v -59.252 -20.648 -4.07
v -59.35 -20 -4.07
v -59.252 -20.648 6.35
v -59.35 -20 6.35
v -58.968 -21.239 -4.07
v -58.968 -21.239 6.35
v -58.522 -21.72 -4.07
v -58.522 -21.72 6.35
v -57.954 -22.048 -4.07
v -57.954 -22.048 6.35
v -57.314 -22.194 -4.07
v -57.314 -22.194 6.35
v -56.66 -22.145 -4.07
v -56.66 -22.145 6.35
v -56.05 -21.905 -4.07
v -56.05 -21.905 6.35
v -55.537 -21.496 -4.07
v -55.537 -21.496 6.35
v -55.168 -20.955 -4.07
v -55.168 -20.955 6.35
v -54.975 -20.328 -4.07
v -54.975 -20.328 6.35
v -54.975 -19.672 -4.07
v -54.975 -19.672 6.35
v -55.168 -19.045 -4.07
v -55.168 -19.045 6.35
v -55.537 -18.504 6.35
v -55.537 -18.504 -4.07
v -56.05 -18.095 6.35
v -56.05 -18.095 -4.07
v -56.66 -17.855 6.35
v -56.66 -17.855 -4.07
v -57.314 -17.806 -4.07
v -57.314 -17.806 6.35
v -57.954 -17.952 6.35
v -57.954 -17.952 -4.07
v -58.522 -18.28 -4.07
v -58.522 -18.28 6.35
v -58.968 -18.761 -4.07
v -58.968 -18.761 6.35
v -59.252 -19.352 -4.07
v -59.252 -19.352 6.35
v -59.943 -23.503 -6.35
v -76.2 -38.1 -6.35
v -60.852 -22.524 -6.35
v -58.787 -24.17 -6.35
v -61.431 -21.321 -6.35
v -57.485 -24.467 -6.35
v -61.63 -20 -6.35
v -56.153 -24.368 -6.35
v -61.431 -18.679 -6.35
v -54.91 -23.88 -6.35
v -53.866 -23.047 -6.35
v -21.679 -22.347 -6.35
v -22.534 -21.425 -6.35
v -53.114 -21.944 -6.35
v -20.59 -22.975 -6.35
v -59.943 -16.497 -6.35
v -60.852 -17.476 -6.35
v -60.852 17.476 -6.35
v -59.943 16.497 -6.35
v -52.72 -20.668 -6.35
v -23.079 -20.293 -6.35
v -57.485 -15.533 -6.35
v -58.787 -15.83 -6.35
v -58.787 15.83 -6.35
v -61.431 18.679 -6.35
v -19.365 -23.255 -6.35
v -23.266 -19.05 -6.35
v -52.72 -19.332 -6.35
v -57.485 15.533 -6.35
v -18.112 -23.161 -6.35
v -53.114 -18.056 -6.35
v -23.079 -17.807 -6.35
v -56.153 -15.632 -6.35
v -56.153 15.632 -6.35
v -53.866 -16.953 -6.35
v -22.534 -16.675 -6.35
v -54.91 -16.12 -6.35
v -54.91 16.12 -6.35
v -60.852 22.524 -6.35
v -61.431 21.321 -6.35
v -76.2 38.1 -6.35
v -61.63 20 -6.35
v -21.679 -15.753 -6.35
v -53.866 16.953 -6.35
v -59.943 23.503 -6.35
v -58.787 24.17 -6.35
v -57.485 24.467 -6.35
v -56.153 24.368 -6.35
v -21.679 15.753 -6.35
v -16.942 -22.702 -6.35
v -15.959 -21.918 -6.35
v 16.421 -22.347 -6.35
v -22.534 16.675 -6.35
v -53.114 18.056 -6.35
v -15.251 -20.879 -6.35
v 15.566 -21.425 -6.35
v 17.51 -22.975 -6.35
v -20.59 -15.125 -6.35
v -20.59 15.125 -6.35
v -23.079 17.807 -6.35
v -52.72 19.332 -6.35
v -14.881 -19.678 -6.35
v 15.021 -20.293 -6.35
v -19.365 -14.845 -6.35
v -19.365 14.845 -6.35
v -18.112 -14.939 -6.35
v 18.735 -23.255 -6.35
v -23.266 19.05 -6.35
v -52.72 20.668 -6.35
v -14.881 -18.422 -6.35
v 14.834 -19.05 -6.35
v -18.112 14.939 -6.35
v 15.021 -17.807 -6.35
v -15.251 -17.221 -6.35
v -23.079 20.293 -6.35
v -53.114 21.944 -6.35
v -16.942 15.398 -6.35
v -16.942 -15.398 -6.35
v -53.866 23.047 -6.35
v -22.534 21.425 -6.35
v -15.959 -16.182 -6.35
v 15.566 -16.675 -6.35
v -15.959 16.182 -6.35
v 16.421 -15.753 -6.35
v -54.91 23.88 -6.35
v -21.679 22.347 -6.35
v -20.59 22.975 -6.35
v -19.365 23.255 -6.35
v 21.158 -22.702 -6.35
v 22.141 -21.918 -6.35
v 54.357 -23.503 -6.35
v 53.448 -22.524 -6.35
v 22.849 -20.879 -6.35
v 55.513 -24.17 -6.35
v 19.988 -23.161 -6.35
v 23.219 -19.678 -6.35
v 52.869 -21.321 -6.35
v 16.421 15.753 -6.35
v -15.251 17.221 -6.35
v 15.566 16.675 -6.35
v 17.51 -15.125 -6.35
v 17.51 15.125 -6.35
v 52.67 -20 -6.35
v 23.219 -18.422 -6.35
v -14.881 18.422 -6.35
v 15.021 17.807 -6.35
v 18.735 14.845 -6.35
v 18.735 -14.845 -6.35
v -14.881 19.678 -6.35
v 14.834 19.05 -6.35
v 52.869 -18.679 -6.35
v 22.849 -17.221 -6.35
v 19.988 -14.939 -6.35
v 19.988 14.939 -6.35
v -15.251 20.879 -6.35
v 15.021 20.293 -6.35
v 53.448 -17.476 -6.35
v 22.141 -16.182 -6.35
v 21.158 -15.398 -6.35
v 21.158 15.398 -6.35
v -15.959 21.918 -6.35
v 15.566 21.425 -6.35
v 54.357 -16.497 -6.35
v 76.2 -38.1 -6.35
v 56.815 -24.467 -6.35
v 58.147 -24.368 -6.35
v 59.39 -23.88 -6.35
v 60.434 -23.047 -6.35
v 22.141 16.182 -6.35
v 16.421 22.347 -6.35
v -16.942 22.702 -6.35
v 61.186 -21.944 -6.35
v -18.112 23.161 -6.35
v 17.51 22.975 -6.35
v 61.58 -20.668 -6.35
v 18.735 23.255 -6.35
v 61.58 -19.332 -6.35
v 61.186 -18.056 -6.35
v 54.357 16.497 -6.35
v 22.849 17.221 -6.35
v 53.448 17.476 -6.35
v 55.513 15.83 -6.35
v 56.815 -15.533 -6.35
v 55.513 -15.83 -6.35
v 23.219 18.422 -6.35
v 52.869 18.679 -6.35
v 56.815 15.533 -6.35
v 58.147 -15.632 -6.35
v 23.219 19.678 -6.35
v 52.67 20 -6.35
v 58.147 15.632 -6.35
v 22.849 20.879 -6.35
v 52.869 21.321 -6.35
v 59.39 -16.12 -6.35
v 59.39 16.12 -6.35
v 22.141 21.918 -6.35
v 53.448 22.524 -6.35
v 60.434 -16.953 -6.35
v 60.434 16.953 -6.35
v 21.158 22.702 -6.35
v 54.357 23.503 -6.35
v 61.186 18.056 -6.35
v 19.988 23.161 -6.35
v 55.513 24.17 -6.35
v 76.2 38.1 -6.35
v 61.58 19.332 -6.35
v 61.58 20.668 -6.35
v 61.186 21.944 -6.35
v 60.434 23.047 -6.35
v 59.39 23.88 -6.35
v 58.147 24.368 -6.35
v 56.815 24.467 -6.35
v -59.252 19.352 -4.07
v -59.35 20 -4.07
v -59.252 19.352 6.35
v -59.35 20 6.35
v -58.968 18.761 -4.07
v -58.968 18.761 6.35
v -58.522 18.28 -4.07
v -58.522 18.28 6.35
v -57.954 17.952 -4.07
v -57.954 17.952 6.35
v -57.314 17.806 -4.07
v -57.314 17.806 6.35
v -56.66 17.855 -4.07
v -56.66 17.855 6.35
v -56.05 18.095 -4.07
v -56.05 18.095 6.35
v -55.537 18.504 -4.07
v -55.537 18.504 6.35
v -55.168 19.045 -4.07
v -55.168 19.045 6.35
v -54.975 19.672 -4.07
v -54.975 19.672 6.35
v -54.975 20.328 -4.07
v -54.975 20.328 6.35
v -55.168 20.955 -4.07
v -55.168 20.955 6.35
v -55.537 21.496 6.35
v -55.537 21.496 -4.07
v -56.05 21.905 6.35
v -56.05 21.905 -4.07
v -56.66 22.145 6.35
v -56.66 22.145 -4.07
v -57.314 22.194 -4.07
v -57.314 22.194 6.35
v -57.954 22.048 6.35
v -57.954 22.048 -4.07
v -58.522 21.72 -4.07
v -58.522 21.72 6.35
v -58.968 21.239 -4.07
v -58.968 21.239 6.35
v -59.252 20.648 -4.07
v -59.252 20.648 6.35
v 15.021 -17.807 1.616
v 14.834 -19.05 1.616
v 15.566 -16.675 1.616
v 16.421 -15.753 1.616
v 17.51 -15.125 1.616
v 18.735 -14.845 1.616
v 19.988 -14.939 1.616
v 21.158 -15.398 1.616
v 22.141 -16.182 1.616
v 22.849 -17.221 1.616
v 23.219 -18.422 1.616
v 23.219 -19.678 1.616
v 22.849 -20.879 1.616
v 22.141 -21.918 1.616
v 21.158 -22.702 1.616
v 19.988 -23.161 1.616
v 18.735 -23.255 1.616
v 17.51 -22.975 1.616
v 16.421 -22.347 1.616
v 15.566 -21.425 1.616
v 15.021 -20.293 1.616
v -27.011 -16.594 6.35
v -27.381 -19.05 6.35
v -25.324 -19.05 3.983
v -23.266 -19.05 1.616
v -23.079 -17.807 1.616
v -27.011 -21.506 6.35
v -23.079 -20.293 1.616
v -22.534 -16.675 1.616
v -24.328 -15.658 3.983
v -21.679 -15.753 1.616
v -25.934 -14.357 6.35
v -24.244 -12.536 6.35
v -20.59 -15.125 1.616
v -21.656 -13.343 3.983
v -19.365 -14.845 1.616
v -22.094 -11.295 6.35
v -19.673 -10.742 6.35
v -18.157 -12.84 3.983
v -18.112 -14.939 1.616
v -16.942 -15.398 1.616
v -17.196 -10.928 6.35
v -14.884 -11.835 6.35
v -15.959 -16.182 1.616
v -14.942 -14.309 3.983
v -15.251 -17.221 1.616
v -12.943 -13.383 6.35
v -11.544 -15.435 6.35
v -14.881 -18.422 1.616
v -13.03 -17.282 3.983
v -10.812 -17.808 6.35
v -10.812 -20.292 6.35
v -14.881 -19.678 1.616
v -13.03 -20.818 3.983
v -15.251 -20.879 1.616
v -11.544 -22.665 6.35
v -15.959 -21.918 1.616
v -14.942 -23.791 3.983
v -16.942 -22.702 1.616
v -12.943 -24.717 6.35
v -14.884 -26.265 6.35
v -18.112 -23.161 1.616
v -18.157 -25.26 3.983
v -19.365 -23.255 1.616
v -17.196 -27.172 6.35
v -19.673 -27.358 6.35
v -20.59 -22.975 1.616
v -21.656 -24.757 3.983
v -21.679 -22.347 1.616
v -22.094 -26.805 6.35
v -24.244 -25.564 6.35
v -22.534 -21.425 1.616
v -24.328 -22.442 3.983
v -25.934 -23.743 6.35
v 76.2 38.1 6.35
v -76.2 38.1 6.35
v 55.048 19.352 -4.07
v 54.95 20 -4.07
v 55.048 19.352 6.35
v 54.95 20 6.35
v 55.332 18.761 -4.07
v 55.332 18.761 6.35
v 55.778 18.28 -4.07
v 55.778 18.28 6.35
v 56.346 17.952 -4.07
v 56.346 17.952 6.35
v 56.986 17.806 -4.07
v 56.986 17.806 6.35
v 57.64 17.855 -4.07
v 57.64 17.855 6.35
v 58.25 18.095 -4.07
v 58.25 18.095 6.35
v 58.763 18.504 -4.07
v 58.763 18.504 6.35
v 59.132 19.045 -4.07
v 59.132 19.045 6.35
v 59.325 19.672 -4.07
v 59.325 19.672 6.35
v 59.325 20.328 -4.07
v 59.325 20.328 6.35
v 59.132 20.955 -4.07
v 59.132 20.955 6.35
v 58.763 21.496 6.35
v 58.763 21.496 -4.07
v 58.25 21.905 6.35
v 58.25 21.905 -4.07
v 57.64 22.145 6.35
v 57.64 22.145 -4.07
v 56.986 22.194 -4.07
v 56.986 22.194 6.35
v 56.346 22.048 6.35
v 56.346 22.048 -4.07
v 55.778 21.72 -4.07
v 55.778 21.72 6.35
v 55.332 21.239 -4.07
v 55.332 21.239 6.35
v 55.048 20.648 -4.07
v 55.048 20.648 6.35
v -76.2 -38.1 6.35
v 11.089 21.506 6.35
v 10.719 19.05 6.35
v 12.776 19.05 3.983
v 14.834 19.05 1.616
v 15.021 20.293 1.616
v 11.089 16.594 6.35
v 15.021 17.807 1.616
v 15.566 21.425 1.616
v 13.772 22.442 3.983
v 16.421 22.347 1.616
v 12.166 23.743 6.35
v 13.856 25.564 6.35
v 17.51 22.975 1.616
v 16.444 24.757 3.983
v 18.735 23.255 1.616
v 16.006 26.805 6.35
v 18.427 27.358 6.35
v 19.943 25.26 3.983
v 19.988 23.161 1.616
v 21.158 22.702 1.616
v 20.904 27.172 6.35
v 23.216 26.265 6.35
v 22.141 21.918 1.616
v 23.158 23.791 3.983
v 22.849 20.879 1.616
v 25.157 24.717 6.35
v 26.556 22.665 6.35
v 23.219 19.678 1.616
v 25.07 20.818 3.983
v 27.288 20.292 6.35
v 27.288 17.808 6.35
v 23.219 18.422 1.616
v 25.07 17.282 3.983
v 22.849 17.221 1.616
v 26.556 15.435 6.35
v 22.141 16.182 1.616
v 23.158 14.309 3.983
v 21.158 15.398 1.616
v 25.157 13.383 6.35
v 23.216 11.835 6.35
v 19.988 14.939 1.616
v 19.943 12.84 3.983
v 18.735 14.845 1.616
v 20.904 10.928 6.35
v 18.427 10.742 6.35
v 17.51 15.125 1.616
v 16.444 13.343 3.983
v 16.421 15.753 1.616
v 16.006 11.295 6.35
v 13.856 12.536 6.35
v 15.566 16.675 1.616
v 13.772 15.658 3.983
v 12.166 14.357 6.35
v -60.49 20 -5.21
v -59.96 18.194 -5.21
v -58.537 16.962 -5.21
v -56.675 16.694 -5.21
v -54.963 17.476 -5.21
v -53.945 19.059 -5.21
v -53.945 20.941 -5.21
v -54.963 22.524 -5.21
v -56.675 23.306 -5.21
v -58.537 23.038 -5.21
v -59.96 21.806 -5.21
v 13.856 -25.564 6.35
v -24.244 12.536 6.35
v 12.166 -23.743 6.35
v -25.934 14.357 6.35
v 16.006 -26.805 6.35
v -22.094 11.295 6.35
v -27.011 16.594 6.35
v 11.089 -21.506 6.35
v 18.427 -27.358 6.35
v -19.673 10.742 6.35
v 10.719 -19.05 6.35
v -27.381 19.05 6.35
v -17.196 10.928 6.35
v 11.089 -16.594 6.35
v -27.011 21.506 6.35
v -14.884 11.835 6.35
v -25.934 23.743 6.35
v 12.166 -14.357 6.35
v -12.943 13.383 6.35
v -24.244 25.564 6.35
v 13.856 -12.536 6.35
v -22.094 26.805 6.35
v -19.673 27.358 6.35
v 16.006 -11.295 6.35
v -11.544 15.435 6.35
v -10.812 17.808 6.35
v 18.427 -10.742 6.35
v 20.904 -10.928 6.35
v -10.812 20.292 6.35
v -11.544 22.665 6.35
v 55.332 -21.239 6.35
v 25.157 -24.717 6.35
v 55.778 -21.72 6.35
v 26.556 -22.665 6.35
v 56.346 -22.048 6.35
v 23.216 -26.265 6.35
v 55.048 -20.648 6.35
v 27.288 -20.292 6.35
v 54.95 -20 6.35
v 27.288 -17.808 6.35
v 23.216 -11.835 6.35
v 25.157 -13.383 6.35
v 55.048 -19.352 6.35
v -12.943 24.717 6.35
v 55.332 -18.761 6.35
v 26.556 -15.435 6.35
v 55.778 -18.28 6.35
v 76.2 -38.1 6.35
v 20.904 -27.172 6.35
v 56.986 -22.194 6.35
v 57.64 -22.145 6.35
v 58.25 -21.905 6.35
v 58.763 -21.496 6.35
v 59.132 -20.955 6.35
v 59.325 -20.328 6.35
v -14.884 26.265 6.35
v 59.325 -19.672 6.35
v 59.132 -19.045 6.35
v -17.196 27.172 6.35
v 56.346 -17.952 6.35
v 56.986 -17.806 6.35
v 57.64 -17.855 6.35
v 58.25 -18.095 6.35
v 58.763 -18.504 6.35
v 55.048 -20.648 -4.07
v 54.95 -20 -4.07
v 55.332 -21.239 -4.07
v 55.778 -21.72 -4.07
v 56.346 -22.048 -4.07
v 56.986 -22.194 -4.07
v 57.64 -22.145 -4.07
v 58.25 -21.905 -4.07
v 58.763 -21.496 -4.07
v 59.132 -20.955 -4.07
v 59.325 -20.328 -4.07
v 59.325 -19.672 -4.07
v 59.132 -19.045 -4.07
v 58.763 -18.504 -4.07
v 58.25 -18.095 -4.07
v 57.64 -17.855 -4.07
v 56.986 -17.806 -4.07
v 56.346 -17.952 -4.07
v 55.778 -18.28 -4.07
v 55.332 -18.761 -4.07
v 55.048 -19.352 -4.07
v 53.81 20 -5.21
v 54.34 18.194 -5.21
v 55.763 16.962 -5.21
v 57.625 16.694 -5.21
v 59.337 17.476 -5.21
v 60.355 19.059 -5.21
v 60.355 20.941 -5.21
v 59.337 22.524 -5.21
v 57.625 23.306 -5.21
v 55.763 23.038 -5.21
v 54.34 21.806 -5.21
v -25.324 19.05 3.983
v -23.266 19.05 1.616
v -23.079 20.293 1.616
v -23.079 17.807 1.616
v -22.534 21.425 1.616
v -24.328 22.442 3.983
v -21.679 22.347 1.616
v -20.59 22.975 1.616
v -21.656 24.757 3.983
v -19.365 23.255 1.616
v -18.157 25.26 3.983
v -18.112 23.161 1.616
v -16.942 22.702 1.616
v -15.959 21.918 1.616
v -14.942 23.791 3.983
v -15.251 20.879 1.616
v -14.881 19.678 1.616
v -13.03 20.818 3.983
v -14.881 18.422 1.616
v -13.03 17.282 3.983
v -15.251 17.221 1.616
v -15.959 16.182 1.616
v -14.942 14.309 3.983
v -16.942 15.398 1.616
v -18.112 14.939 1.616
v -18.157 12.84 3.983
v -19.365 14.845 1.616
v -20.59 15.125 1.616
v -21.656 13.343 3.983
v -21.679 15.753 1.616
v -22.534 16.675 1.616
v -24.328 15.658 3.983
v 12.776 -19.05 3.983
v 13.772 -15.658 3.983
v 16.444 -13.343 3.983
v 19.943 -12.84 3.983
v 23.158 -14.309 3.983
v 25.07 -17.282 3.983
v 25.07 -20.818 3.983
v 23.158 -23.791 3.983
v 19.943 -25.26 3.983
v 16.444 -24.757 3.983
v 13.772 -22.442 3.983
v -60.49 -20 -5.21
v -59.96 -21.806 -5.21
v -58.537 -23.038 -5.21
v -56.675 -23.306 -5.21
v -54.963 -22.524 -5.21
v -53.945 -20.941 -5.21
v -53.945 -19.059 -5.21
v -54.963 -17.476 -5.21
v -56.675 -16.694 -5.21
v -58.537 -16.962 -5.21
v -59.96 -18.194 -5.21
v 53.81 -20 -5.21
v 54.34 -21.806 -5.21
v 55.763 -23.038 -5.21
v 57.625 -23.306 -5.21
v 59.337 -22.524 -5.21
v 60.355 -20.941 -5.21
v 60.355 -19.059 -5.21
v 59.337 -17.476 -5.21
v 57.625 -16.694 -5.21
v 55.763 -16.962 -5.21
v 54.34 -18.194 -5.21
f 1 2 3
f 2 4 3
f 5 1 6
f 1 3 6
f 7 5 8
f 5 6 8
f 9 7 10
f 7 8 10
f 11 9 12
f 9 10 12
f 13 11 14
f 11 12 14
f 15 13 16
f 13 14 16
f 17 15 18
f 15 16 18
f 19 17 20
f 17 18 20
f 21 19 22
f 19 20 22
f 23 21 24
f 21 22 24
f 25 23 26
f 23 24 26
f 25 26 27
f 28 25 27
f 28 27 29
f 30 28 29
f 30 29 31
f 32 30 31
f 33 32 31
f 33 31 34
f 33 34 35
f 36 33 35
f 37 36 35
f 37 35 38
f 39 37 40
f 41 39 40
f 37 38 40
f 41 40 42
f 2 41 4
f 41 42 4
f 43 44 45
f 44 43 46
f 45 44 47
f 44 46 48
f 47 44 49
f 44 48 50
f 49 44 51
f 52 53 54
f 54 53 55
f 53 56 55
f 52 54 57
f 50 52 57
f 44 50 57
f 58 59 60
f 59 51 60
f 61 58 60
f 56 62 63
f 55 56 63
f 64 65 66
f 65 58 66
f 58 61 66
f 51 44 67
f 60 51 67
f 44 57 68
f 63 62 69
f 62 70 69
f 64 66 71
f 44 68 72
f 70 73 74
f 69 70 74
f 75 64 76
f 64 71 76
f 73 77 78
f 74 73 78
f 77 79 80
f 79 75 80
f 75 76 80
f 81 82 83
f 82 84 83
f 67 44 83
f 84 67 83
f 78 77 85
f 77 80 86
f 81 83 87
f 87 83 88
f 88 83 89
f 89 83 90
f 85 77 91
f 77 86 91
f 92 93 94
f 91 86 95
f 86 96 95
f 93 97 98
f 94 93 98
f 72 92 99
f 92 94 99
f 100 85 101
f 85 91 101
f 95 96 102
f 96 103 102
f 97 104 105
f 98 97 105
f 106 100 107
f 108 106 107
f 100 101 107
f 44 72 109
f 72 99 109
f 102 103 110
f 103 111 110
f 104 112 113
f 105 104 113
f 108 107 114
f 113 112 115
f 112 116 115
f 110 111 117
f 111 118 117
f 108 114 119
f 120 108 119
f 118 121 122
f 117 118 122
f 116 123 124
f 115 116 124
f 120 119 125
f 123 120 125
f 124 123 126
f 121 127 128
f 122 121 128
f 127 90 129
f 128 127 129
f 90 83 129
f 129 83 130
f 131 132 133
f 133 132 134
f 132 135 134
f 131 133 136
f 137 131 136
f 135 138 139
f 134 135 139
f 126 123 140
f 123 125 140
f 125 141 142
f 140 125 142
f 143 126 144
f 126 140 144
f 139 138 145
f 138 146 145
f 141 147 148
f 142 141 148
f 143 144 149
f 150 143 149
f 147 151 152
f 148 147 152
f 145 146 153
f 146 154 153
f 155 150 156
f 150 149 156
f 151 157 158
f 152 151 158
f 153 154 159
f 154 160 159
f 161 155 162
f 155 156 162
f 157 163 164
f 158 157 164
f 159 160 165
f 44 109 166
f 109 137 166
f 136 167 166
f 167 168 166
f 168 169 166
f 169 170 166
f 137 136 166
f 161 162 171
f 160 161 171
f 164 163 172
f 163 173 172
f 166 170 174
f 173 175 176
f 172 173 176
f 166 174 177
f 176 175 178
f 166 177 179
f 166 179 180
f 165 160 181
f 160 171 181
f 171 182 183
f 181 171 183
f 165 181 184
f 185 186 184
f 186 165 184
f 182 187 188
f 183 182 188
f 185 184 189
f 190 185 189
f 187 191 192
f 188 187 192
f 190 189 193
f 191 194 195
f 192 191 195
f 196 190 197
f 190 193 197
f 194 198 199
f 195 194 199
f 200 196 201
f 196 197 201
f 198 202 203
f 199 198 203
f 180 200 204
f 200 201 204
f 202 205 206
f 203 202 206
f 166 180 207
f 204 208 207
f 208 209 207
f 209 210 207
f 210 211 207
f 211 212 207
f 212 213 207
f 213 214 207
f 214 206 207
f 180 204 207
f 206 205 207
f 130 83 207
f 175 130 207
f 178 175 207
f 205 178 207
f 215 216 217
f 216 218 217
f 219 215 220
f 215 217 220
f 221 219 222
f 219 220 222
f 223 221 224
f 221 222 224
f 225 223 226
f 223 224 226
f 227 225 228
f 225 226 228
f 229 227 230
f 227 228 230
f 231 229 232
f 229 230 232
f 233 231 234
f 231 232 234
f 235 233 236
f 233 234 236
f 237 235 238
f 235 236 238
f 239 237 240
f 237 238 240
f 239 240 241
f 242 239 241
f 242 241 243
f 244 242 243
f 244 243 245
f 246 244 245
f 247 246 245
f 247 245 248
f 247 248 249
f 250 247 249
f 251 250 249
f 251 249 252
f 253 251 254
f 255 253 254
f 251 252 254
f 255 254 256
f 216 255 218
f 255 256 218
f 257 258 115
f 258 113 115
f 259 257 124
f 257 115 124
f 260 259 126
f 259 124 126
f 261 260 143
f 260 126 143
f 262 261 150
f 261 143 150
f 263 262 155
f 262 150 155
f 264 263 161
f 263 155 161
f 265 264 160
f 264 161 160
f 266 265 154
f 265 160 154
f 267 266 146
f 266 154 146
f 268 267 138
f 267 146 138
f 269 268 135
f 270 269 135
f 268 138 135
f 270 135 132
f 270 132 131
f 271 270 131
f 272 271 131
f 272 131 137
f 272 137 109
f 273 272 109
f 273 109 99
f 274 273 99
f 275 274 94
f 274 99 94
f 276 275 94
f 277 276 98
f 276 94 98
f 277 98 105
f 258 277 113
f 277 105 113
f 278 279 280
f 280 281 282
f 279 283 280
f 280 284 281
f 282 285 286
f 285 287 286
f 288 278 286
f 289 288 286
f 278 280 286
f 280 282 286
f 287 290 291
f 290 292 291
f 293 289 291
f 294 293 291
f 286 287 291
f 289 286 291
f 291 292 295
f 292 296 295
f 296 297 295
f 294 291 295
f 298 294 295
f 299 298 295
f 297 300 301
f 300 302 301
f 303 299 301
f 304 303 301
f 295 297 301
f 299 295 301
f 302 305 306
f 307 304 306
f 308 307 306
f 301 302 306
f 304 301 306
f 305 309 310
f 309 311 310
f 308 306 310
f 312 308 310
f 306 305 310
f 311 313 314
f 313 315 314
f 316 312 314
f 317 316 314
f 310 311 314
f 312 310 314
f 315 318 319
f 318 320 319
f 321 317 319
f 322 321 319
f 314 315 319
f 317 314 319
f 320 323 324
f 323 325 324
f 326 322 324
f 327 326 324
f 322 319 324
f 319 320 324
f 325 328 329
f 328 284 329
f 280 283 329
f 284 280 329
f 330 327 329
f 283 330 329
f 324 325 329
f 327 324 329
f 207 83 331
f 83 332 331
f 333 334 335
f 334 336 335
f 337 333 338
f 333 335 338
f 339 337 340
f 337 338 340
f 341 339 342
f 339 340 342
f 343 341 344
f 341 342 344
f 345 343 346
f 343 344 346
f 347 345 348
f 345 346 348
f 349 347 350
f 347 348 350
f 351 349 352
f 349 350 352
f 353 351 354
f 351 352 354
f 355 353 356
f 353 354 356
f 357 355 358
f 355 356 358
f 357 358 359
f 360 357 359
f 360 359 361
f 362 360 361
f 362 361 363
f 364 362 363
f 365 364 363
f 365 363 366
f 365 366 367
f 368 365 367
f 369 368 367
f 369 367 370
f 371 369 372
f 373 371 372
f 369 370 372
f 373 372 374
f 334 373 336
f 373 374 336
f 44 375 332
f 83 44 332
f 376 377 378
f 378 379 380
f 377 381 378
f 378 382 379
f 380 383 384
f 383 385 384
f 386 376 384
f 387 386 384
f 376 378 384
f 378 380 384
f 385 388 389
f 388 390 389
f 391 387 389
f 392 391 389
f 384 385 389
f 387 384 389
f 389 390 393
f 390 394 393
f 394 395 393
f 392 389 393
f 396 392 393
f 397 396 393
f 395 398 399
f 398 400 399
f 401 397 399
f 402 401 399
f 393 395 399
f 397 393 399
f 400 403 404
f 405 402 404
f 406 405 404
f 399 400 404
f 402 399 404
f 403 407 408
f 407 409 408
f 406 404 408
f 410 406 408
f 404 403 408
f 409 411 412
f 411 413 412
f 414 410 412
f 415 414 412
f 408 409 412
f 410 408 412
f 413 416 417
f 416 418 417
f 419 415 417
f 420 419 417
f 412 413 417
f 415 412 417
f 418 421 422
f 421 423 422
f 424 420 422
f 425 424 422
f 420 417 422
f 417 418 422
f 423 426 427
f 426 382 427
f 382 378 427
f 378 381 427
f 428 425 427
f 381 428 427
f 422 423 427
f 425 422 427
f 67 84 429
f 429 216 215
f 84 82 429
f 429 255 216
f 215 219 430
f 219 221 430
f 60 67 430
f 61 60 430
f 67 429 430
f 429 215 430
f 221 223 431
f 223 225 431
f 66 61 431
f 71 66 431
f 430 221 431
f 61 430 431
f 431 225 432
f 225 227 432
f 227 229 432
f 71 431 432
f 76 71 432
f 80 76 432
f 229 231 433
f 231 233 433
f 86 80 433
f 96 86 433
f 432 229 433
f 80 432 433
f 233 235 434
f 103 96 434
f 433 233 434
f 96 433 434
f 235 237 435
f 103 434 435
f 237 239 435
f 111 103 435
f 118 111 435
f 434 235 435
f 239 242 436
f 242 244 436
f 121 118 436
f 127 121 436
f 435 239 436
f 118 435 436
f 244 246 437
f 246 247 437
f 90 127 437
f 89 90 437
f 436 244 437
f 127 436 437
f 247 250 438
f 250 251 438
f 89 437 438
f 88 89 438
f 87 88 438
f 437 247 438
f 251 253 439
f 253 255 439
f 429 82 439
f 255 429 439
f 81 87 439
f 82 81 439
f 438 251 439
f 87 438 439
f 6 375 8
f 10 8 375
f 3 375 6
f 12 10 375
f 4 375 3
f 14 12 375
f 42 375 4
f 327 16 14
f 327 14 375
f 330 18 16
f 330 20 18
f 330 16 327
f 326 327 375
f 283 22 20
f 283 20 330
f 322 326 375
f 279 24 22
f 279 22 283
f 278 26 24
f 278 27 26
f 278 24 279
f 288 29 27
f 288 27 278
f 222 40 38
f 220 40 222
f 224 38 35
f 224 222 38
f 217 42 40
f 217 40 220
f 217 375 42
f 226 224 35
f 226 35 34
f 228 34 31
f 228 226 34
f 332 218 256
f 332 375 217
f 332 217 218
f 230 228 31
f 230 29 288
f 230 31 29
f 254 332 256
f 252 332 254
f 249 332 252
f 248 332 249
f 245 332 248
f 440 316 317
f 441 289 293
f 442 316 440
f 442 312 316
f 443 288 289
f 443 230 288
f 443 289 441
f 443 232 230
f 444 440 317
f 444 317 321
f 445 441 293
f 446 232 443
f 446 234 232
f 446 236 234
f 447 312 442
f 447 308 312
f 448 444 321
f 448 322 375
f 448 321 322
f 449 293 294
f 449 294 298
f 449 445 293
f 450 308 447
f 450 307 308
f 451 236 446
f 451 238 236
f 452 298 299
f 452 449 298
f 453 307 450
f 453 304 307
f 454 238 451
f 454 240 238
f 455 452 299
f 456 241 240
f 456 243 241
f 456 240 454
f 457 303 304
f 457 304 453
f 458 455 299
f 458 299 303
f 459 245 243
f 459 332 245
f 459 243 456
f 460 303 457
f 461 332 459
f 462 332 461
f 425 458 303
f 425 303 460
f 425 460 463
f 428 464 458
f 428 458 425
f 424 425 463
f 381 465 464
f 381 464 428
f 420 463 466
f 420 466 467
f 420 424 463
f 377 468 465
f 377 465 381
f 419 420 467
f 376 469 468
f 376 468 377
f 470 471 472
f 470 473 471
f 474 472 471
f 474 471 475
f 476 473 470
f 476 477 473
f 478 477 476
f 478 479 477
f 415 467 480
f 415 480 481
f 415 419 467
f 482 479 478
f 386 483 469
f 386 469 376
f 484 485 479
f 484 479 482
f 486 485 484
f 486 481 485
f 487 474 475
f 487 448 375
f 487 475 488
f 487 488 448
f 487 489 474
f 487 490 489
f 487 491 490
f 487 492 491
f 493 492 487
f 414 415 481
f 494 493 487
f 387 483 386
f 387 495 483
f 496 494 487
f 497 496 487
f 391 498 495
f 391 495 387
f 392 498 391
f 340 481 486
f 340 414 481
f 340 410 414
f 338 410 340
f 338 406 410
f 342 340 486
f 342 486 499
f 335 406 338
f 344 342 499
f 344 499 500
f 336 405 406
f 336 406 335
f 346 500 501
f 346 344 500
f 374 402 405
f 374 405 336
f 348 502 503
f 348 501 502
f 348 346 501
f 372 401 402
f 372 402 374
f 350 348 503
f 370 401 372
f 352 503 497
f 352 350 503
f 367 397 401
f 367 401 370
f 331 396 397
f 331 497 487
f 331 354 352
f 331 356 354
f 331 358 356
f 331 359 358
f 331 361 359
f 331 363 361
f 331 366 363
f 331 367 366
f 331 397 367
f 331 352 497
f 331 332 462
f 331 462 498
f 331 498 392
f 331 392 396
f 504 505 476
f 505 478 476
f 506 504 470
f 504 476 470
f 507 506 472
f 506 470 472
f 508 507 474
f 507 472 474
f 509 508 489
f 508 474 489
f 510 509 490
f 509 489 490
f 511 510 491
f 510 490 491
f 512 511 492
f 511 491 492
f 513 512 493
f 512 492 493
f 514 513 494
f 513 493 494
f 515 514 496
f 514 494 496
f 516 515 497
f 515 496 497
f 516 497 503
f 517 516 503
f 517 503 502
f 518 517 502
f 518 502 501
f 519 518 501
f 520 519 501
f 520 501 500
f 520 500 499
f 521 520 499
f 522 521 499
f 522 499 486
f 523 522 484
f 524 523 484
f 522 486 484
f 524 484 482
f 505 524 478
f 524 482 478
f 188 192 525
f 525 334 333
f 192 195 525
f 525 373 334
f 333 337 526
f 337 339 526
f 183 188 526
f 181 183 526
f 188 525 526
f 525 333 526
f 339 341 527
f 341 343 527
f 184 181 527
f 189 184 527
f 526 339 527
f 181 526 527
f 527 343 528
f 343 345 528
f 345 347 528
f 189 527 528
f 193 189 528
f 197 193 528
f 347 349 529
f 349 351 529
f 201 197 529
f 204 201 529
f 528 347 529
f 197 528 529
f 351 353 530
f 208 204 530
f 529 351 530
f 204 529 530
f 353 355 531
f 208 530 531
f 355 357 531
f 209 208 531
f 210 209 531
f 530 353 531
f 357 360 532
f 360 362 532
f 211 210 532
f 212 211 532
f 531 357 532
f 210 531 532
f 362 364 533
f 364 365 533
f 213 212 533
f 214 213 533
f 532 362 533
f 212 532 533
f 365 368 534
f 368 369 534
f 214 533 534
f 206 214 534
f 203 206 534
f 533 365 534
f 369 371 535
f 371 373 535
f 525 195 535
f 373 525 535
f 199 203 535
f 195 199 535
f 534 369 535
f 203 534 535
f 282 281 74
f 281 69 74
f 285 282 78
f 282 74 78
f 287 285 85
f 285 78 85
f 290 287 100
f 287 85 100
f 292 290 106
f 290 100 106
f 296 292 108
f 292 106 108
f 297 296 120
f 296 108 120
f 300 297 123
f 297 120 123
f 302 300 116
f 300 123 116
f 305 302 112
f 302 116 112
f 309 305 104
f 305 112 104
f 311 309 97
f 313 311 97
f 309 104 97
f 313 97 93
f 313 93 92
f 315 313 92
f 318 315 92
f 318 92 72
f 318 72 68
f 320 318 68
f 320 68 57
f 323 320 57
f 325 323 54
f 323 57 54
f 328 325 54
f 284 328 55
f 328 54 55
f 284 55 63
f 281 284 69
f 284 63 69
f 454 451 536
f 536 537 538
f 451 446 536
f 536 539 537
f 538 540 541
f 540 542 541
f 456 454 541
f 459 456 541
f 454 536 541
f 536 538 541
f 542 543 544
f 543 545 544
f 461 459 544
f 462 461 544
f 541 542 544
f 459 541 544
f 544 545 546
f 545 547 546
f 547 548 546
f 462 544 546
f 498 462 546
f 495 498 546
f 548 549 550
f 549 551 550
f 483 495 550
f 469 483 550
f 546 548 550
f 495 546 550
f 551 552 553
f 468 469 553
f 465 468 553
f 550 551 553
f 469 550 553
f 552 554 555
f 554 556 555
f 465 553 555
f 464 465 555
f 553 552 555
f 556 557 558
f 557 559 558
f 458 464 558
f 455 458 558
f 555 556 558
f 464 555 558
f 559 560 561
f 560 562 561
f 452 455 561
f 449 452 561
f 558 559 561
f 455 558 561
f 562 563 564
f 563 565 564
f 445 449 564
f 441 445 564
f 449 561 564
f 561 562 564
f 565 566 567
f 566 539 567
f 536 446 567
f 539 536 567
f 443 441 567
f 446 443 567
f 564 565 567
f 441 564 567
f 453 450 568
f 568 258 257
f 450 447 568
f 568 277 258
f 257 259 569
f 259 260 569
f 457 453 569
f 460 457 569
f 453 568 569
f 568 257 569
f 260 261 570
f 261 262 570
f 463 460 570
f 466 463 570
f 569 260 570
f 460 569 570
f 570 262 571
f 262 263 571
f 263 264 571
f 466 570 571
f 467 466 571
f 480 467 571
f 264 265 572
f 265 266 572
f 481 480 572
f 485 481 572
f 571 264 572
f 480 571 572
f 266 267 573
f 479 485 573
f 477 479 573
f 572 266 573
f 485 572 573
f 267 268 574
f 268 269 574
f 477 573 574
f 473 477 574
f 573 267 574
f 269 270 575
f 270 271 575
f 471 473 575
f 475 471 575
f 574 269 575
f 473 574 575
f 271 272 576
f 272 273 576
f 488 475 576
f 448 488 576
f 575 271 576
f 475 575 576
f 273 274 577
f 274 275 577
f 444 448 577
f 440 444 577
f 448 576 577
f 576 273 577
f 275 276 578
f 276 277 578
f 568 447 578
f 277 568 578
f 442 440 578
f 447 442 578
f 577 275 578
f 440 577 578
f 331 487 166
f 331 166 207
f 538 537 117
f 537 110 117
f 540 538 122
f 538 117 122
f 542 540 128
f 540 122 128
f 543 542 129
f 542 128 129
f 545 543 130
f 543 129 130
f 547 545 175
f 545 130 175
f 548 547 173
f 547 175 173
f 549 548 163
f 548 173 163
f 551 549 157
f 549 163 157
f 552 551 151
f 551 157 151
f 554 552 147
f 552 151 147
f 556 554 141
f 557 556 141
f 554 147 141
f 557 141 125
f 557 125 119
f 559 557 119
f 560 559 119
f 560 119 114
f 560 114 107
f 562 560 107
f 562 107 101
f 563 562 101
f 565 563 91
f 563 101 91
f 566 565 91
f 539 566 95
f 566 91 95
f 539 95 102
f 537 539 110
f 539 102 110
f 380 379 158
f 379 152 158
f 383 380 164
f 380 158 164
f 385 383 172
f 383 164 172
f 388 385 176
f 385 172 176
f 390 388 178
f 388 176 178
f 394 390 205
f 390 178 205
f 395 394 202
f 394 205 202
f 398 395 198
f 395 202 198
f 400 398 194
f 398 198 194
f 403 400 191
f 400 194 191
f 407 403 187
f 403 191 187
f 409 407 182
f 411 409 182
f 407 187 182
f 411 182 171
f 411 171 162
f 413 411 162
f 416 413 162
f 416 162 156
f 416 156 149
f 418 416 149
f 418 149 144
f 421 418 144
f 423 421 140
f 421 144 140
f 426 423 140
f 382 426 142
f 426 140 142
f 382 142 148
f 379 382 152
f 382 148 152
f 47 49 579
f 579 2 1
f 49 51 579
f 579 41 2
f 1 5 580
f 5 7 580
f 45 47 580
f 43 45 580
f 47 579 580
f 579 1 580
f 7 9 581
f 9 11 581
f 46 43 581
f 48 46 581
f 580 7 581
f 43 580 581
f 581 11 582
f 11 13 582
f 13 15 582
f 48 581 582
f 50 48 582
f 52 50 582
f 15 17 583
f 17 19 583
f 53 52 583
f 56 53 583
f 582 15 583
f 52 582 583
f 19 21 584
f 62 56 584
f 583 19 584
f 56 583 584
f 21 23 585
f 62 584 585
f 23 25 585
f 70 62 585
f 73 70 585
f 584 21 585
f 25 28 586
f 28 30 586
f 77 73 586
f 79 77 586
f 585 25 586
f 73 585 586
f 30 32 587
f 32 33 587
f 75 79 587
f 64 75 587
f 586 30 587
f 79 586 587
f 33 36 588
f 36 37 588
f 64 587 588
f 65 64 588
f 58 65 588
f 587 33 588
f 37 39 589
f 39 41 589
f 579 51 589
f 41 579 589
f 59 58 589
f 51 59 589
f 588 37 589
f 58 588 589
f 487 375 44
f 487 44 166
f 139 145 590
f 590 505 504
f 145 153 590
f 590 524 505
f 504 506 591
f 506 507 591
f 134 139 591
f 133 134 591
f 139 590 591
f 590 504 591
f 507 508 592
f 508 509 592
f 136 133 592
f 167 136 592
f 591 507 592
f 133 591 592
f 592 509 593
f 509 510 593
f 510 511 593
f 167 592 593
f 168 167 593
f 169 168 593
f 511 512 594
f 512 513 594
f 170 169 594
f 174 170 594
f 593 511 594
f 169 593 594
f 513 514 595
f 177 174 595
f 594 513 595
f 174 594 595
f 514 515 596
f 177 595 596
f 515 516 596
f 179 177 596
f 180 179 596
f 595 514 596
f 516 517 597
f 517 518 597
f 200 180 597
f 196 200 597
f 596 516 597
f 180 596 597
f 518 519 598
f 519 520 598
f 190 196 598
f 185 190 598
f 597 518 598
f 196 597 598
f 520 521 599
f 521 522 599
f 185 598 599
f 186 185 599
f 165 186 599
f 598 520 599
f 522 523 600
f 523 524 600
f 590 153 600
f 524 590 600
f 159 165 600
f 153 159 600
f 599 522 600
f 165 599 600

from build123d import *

# Parameters (mm, degrees)
F0_W           = 152.4
F0_H           = 76.2
F1_DEPTH       = 6.35
F3_D           = 8.4328
F3_CSINK_D     = 16.6624
F3_CSINK_ANGLE = 82
F5_D           = 4.4
F5_CSINK_D     = 8.96
F5_CSINK_ANGLE = 90


with BuildPart() as f1:
    # F0 (on Top) → F1 (new body, symmetric)
    with BuildSketch(Plane.XY):
        Rectangle(F0_W, F0_H)
    extrude(amount=F1_DEPTH, both=True)

    # F3 (through all)
    with Locations(Plane.XY.offset(6.35)):
        with Locations((-19.05, 19.05), (19.05, 19.05), (19.05, -19.05), (-19.05, -19.05)):
            CounterSinkHole(F3_D / 2, F3_CSINK_D / 2, counter_sink_angle=F3_CSINK_ANGLE)

    # F5 (through all)
    with Locations(Plane(origin=(0, 0, -6.35), x_dir=(1, 0, 0), z_dir=(0, 0, -1))):
        with Locations((-57.15, 20), (57.15, 20), (57.15, -20), (-57.15, -20)):
            CounterSinkHole(F5_D / 2, F5_CSINK_D / 2, counter_sink_angle=F5_CSINK_ANGLE)


solid = f1.part
